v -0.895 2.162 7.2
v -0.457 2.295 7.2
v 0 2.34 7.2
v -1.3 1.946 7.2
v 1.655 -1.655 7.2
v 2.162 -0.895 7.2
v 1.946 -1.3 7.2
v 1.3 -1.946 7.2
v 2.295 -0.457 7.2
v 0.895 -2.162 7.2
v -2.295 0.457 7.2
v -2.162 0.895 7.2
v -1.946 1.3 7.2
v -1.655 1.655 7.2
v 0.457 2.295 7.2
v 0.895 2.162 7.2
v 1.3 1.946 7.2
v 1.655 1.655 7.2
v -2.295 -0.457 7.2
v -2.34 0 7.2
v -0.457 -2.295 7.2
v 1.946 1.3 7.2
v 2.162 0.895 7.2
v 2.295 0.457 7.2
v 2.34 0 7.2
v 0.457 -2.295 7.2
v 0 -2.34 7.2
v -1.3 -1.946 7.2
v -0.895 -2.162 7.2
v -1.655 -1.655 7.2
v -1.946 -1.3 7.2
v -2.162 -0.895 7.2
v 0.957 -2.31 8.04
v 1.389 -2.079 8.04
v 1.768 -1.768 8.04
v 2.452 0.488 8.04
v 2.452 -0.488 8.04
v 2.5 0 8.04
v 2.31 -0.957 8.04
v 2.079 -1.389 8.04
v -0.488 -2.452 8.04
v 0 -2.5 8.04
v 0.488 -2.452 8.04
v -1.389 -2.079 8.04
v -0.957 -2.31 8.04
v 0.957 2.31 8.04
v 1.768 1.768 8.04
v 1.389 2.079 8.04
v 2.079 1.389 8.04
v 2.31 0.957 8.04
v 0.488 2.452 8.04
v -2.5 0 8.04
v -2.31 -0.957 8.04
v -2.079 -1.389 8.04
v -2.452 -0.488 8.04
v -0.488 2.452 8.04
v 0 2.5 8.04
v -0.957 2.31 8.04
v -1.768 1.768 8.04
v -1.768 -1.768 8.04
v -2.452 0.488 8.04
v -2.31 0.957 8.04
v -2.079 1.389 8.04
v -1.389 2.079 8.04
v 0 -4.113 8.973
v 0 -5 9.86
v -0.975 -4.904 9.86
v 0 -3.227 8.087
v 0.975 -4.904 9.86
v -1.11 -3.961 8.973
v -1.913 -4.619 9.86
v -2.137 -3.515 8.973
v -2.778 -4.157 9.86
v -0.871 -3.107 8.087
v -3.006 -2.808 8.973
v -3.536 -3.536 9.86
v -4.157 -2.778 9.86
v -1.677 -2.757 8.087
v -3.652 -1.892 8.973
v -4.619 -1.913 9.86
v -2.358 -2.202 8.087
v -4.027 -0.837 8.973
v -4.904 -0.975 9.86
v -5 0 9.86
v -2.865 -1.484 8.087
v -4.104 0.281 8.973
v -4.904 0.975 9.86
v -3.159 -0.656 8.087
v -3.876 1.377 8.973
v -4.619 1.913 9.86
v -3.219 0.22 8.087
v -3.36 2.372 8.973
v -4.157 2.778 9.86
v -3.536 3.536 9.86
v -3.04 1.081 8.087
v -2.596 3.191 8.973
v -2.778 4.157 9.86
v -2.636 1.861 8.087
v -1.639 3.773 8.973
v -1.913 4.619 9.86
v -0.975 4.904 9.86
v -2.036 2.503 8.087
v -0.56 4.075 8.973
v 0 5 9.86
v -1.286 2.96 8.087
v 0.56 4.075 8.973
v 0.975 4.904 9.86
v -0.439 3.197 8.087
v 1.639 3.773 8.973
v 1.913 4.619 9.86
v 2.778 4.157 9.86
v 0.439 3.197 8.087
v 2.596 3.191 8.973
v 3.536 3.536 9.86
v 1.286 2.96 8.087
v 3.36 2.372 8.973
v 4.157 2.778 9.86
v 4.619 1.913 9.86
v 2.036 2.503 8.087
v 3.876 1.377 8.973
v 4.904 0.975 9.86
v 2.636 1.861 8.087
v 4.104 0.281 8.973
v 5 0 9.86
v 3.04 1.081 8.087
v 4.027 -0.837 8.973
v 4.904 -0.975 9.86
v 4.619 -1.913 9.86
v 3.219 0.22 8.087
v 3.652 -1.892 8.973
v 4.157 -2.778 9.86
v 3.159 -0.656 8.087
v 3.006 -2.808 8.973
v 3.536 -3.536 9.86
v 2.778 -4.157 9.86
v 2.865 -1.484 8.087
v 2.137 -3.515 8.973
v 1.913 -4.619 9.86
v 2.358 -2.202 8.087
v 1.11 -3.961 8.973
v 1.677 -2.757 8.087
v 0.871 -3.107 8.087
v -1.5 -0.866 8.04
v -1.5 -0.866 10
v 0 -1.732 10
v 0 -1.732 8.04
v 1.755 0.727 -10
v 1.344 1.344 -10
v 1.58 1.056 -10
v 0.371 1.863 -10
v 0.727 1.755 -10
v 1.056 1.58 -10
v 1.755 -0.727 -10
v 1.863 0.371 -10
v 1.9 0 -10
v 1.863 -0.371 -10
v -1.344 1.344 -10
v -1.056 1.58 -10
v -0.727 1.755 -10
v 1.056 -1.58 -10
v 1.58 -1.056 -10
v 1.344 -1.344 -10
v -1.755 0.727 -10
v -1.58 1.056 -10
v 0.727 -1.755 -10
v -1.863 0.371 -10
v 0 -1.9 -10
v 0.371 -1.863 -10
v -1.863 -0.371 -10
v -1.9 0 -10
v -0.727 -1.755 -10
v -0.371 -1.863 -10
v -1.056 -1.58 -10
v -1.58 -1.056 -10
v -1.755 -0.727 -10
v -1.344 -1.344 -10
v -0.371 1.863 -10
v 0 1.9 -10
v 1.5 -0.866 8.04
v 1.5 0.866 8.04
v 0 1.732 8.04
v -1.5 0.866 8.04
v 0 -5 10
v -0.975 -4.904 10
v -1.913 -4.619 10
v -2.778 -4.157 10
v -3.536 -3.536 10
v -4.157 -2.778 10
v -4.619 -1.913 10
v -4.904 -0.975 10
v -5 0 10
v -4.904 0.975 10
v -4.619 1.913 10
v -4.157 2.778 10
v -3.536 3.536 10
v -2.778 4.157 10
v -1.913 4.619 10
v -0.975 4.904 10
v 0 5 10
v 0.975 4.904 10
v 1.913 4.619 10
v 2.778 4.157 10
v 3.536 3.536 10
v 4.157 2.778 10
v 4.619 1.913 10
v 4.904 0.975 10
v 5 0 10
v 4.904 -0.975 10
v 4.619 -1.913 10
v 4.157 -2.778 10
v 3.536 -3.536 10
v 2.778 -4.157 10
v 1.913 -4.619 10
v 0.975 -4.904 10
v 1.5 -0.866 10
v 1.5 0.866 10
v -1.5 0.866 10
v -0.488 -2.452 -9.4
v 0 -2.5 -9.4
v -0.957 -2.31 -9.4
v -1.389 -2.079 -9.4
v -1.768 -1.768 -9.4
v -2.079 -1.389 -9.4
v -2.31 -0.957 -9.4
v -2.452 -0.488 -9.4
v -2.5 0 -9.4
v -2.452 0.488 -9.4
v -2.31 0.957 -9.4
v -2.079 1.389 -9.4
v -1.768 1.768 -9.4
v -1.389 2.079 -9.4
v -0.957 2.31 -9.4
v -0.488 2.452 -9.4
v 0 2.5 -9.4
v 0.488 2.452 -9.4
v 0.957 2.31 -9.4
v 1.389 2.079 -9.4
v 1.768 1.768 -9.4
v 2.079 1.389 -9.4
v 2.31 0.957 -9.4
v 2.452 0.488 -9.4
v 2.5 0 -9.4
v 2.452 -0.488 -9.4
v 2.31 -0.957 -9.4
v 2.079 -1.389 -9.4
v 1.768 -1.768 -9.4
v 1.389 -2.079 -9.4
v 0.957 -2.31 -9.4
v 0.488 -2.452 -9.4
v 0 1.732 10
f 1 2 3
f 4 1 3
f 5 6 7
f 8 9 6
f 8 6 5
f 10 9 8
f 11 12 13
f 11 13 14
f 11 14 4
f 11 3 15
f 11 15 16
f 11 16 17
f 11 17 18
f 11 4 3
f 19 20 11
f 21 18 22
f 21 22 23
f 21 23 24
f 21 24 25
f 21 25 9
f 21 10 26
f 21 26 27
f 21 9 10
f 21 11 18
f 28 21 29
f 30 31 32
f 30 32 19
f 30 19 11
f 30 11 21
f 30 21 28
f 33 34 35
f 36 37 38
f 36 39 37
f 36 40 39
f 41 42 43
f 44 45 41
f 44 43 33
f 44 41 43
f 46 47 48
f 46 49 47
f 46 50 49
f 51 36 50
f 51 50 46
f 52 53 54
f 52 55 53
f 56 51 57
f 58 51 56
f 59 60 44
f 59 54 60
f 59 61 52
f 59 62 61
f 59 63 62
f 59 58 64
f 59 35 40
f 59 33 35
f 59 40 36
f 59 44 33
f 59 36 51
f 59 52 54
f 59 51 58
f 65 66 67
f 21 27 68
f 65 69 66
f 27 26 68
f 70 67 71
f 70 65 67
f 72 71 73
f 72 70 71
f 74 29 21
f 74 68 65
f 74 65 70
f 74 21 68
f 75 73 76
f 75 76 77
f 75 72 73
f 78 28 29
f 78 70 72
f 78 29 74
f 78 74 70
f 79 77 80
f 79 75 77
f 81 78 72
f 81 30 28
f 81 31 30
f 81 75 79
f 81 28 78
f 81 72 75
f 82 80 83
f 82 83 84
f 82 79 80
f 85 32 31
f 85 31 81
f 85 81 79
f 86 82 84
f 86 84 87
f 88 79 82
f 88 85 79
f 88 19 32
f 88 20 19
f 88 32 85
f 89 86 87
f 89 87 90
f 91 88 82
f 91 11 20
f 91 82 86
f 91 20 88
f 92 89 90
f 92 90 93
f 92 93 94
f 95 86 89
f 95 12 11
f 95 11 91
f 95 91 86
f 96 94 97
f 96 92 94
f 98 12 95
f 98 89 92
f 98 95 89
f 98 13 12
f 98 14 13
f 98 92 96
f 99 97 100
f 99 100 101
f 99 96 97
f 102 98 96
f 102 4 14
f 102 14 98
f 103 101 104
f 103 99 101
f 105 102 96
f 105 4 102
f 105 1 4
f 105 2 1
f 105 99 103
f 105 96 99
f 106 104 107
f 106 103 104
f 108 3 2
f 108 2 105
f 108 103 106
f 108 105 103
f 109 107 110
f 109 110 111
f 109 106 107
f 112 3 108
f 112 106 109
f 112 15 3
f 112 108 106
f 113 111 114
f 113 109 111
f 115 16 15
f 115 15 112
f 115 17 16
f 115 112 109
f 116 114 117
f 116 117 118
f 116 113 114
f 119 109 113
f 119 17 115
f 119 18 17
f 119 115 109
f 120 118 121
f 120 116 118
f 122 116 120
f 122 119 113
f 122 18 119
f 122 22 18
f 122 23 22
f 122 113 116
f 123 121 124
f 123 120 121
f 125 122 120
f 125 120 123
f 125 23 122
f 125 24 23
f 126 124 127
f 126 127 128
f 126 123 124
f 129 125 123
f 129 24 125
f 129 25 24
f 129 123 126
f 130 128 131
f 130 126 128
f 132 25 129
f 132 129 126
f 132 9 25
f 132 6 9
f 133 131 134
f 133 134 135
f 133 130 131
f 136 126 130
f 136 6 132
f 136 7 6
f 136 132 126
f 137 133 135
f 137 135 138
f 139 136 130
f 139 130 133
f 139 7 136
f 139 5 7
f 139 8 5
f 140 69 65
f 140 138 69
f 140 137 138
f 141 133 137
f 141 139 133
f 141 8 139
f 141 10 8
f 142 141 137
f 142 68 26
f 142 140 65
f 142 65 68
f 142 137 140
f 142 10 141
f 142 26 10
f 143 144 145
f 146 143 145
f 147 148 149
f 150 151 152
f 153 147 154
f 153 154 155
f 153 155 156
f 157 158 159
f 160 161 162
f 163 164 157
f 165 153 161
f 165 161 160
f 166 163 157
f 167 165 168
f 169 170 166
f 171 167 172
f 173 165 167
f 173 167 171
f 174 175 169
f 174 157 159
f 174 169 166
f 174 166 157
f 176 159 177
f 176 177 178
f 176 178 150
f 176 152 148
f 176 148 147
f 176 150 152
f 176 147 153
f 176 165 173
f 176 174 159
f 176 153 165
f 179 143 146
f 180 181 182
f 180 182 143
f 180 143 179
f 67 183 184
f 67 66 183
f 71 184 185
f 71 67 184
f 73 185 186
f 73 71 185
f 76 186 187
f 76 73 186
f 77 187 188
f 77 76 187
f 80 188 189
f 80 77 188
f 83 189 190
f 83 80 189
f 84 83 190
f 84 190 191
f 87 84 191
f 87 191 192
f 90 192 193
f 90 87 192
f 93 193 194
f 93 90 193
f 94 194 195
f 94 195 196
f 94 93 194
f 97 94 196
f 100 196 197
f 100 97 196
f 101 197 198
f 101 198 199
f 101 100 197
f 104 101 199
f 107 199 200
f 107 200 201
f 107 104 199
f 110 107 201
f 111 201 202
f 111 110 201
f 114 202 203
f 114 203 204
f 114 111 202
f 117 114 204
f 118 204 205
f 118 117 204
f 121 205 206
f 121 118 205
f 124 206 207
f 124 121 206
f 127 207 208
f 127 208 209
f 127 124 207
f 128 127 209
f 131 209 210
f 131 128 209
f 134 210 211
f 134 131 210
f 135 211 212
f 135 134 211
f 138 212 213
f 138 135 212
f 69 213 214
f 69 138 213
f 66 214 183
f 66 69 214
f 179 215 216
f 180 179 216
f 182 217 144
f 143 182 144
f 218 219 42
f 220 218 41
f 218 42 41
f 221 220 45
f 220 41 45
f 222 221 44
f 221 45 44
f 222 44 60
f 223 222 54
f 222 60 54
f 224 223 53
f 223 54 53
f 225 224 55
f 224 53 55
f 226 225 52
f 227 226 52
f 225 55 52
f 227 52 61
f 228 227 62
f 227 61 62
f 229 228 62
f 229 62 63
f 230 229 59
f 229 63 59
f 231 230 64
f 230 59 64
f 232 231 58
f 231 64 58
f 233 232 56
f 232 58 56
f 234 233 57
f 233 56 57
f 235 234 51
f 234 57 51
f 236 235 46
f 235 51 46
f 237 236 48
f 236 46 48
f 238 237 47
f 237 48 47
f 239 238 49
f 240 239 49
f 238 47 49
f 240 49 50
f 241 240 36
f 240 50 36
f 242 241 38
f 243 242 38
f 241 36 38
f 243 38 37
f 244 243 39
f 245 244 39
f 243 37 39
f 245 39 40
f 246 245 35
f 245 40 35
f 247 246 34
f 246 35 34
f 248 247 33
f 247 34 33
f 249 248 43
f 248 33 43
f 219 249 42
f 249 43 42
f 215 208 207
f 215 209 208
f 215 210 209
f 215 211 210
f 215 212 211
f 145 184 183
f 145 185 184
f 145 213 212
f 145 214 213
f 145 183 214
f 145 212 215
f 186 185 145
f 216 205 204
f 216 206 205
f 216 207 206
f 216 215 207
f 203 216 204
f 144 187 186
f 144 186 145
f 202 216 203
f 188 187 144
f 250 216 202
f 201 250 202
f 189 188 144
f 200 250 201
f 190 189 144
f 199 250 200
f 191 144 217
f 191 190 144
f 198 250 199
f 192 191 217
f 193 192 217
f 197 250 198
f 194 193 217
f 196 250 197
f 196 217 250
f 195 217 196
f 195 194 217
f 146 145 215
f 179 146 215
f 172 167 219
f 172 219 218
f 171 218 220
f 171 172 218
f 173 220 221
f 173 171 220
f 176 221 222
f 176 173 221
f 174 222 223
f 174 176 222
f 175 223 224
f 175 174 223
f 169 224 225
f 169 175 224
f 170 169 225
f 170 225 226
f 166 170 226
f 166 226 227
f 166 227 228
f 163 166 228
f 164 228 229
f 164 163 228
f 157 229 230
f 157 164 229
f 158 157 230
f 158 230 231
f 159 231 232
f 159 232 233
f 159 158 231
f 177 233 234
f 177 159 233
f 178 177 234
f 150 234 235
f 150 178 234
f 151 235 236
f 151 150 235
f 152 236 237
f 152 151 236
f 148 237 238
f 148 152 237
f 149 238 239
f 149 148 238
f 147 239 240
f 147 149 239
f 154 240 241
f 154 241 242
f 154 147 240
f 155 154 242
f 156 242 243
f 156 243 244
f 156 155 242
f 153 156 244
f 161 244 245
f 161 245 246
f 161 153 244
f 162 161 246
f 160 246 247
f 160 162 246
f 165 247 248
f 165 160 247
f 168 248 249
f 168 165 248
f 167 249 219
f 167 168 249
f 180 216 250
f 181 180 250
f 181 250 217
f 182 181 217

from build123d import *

# Parameters (mm, degrees)
CHAMFER1_SIZE      = 0.6
CUT_EXTRUDE2_DEPTH = 1.96


with BuildPart() as part:
    # Sketch1 → Revolve1 (revolve)
    with BuildSketch(Plane(origin=(0, 0, 0), x_dir=(0, 0, -1), z_dir=(1, 0, 0))):
        Polygon((-7.2, 2.5), (10, 2.5), (10, 0), (-8.04, 0), (-8.04, 2.5), align=None)
    revolve(axis=Axis((0, 0, 8.04), (0, 0, -1)))

    # Chamfer1
    chamfer1_edges = [part.edges().sort_by_distance(p)[0] for p in [
        (0, -2.5, -10),
    ]]
    chamfer(chamfer1_edges, length=CHAMFER1_SIZE)


with BuildPart() as body_2:
    # Sketch7 → Revolve2 (revolve)
    with BuildSketch(Plane(origin=(0, 0, 0), x_dir=(0, 0, -1), z_dir=(1, 0, 0))):
        Polygon((-9.86, 5), (-10, 5), (-10, 0), (-7.2, 0), (-7.2, 2.34), align=None)
    revolve(axis=Axis((0, 0, 10), (0, 0, -1)))

    # Sketch5 → Cut-Extrude2 (cut)
    with BuildSketch(Plane.XY.offset(10)):
        Polygon((1.5, -0.866025404), (1.5, 0.866025404), (0, 1.732050808), (-1.5, 0.866025404), (-1.5, -0.866025404), (0, -1.732050808), align=None)
    extrude(amount=-CUT_EXTRUDE2_DEPTH, mode=Mode.SUBTRACT)


solid = Compound([part.part, body_2.part])
